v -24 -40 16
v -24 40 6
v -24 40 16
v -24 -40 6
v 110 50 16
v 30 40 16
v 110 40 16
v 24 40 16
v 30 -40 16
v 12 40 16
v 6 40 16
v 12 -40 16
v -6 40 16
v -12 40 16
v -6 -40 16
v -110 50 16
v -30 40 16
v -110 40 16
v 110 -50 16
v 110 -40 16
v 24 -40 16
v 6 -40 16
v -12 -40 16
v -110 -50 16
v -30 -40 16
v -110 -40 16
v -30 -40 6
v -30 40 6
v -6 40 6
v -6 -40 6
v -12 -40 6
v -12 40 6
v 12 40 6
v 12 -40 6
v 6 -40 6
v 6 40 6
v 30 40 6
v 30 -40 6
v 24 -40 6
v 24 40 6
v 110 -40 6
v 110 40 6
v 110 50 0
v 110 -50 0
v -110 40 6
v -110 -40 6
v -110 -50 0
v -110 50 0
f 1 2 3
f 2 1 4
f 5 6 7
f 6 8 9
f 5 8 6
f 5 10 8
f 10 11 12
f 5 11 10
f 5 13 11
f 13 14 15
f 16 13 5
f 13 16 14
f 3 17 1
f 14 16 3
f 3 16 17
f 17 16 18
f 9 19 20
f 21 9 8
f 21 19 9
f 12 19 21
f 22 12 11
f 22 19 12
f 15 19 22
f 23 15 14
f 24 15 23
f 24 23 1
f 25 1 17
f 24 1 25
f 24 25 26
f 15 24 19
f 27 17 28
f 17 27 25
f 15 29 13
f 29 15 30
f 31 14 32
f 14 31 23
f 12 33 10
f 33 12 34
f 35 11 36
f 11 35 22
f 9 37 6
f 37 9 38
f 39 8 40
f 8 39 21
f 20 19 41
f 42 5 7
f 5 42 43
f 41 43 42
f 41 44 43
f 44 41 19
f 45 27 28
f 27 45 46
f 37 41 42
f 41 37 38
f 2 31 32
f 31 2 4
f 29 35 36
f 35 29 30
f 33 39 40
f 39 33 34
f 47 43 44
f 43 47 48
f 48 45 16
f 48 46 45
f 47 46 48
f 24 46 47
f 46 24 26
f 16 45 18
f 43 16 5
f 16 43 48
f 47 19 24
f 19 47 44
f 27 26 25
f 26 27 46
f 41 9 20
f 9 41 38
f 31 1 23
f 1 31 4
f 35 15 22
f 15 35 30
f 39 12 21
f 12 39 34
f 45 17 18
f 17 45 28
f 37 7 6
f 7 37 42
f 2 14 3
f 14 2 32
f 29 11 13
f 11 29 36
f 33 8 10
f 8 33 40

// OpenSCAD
$fn = 32;

// ----------------------------------------------------------------------
// Rib frame 220 x 100 x 16
// 4 ribs at 18 mm pitch
// ----------------------------------------------------------------------

// --- parameters (mm) ---
frame = [220, 100, 6];  // base plate size (x, y, z)
rail_w = 10;            // side rail width
ribs = 4;               // number of ribs
rib_t = 6;              // rib thickness
rib_h = 10;             // rib height above the base plate
pitch = 18;             // pitch between rib centres

// --- derived feature positions (mm) ---
span = (ribs - 1) * pitch;          // = 54   distance between the outer ribs
origin_x = -span / 2;               // = -27   X of the first rib
rib_len = frame[1] - 2 * rail_w + 2;  // = 82   rib length, 1 mm into each rail
feature_centers = [
  [origin_x + 0 * pitch, 0],
  [origin_x + 1 * pitch, 0],
  [origin_x + 2 * pitch, 0],
  [origin_x + 3 * pitch, 0]
];   // rib centre line, drives the rib loop

// base plate, two side rails, then the ribs read straight off feature_centers
union() {
  translate([-frame[0] / 2, -frame[1] / 2, 0]) cube(frame);
  translate([-frame[0] / 2, -frame[1] / 2, 0]) cube([frame[0], rail_w, frame[2] + rib_h]);
  translate([-frame[0] / 2, frame[1] / 2 - rail_w, 0]) cube([frame[0], rail_w, frame[2] + rib_h]);
  for (centre = feature_centers)
    translate([centre[0] - rib_t / 2, centre[1] - rib_len / 2, frame[2] - 1])
      cube([rib_t, rib_len, rib_h + 1]);
}
